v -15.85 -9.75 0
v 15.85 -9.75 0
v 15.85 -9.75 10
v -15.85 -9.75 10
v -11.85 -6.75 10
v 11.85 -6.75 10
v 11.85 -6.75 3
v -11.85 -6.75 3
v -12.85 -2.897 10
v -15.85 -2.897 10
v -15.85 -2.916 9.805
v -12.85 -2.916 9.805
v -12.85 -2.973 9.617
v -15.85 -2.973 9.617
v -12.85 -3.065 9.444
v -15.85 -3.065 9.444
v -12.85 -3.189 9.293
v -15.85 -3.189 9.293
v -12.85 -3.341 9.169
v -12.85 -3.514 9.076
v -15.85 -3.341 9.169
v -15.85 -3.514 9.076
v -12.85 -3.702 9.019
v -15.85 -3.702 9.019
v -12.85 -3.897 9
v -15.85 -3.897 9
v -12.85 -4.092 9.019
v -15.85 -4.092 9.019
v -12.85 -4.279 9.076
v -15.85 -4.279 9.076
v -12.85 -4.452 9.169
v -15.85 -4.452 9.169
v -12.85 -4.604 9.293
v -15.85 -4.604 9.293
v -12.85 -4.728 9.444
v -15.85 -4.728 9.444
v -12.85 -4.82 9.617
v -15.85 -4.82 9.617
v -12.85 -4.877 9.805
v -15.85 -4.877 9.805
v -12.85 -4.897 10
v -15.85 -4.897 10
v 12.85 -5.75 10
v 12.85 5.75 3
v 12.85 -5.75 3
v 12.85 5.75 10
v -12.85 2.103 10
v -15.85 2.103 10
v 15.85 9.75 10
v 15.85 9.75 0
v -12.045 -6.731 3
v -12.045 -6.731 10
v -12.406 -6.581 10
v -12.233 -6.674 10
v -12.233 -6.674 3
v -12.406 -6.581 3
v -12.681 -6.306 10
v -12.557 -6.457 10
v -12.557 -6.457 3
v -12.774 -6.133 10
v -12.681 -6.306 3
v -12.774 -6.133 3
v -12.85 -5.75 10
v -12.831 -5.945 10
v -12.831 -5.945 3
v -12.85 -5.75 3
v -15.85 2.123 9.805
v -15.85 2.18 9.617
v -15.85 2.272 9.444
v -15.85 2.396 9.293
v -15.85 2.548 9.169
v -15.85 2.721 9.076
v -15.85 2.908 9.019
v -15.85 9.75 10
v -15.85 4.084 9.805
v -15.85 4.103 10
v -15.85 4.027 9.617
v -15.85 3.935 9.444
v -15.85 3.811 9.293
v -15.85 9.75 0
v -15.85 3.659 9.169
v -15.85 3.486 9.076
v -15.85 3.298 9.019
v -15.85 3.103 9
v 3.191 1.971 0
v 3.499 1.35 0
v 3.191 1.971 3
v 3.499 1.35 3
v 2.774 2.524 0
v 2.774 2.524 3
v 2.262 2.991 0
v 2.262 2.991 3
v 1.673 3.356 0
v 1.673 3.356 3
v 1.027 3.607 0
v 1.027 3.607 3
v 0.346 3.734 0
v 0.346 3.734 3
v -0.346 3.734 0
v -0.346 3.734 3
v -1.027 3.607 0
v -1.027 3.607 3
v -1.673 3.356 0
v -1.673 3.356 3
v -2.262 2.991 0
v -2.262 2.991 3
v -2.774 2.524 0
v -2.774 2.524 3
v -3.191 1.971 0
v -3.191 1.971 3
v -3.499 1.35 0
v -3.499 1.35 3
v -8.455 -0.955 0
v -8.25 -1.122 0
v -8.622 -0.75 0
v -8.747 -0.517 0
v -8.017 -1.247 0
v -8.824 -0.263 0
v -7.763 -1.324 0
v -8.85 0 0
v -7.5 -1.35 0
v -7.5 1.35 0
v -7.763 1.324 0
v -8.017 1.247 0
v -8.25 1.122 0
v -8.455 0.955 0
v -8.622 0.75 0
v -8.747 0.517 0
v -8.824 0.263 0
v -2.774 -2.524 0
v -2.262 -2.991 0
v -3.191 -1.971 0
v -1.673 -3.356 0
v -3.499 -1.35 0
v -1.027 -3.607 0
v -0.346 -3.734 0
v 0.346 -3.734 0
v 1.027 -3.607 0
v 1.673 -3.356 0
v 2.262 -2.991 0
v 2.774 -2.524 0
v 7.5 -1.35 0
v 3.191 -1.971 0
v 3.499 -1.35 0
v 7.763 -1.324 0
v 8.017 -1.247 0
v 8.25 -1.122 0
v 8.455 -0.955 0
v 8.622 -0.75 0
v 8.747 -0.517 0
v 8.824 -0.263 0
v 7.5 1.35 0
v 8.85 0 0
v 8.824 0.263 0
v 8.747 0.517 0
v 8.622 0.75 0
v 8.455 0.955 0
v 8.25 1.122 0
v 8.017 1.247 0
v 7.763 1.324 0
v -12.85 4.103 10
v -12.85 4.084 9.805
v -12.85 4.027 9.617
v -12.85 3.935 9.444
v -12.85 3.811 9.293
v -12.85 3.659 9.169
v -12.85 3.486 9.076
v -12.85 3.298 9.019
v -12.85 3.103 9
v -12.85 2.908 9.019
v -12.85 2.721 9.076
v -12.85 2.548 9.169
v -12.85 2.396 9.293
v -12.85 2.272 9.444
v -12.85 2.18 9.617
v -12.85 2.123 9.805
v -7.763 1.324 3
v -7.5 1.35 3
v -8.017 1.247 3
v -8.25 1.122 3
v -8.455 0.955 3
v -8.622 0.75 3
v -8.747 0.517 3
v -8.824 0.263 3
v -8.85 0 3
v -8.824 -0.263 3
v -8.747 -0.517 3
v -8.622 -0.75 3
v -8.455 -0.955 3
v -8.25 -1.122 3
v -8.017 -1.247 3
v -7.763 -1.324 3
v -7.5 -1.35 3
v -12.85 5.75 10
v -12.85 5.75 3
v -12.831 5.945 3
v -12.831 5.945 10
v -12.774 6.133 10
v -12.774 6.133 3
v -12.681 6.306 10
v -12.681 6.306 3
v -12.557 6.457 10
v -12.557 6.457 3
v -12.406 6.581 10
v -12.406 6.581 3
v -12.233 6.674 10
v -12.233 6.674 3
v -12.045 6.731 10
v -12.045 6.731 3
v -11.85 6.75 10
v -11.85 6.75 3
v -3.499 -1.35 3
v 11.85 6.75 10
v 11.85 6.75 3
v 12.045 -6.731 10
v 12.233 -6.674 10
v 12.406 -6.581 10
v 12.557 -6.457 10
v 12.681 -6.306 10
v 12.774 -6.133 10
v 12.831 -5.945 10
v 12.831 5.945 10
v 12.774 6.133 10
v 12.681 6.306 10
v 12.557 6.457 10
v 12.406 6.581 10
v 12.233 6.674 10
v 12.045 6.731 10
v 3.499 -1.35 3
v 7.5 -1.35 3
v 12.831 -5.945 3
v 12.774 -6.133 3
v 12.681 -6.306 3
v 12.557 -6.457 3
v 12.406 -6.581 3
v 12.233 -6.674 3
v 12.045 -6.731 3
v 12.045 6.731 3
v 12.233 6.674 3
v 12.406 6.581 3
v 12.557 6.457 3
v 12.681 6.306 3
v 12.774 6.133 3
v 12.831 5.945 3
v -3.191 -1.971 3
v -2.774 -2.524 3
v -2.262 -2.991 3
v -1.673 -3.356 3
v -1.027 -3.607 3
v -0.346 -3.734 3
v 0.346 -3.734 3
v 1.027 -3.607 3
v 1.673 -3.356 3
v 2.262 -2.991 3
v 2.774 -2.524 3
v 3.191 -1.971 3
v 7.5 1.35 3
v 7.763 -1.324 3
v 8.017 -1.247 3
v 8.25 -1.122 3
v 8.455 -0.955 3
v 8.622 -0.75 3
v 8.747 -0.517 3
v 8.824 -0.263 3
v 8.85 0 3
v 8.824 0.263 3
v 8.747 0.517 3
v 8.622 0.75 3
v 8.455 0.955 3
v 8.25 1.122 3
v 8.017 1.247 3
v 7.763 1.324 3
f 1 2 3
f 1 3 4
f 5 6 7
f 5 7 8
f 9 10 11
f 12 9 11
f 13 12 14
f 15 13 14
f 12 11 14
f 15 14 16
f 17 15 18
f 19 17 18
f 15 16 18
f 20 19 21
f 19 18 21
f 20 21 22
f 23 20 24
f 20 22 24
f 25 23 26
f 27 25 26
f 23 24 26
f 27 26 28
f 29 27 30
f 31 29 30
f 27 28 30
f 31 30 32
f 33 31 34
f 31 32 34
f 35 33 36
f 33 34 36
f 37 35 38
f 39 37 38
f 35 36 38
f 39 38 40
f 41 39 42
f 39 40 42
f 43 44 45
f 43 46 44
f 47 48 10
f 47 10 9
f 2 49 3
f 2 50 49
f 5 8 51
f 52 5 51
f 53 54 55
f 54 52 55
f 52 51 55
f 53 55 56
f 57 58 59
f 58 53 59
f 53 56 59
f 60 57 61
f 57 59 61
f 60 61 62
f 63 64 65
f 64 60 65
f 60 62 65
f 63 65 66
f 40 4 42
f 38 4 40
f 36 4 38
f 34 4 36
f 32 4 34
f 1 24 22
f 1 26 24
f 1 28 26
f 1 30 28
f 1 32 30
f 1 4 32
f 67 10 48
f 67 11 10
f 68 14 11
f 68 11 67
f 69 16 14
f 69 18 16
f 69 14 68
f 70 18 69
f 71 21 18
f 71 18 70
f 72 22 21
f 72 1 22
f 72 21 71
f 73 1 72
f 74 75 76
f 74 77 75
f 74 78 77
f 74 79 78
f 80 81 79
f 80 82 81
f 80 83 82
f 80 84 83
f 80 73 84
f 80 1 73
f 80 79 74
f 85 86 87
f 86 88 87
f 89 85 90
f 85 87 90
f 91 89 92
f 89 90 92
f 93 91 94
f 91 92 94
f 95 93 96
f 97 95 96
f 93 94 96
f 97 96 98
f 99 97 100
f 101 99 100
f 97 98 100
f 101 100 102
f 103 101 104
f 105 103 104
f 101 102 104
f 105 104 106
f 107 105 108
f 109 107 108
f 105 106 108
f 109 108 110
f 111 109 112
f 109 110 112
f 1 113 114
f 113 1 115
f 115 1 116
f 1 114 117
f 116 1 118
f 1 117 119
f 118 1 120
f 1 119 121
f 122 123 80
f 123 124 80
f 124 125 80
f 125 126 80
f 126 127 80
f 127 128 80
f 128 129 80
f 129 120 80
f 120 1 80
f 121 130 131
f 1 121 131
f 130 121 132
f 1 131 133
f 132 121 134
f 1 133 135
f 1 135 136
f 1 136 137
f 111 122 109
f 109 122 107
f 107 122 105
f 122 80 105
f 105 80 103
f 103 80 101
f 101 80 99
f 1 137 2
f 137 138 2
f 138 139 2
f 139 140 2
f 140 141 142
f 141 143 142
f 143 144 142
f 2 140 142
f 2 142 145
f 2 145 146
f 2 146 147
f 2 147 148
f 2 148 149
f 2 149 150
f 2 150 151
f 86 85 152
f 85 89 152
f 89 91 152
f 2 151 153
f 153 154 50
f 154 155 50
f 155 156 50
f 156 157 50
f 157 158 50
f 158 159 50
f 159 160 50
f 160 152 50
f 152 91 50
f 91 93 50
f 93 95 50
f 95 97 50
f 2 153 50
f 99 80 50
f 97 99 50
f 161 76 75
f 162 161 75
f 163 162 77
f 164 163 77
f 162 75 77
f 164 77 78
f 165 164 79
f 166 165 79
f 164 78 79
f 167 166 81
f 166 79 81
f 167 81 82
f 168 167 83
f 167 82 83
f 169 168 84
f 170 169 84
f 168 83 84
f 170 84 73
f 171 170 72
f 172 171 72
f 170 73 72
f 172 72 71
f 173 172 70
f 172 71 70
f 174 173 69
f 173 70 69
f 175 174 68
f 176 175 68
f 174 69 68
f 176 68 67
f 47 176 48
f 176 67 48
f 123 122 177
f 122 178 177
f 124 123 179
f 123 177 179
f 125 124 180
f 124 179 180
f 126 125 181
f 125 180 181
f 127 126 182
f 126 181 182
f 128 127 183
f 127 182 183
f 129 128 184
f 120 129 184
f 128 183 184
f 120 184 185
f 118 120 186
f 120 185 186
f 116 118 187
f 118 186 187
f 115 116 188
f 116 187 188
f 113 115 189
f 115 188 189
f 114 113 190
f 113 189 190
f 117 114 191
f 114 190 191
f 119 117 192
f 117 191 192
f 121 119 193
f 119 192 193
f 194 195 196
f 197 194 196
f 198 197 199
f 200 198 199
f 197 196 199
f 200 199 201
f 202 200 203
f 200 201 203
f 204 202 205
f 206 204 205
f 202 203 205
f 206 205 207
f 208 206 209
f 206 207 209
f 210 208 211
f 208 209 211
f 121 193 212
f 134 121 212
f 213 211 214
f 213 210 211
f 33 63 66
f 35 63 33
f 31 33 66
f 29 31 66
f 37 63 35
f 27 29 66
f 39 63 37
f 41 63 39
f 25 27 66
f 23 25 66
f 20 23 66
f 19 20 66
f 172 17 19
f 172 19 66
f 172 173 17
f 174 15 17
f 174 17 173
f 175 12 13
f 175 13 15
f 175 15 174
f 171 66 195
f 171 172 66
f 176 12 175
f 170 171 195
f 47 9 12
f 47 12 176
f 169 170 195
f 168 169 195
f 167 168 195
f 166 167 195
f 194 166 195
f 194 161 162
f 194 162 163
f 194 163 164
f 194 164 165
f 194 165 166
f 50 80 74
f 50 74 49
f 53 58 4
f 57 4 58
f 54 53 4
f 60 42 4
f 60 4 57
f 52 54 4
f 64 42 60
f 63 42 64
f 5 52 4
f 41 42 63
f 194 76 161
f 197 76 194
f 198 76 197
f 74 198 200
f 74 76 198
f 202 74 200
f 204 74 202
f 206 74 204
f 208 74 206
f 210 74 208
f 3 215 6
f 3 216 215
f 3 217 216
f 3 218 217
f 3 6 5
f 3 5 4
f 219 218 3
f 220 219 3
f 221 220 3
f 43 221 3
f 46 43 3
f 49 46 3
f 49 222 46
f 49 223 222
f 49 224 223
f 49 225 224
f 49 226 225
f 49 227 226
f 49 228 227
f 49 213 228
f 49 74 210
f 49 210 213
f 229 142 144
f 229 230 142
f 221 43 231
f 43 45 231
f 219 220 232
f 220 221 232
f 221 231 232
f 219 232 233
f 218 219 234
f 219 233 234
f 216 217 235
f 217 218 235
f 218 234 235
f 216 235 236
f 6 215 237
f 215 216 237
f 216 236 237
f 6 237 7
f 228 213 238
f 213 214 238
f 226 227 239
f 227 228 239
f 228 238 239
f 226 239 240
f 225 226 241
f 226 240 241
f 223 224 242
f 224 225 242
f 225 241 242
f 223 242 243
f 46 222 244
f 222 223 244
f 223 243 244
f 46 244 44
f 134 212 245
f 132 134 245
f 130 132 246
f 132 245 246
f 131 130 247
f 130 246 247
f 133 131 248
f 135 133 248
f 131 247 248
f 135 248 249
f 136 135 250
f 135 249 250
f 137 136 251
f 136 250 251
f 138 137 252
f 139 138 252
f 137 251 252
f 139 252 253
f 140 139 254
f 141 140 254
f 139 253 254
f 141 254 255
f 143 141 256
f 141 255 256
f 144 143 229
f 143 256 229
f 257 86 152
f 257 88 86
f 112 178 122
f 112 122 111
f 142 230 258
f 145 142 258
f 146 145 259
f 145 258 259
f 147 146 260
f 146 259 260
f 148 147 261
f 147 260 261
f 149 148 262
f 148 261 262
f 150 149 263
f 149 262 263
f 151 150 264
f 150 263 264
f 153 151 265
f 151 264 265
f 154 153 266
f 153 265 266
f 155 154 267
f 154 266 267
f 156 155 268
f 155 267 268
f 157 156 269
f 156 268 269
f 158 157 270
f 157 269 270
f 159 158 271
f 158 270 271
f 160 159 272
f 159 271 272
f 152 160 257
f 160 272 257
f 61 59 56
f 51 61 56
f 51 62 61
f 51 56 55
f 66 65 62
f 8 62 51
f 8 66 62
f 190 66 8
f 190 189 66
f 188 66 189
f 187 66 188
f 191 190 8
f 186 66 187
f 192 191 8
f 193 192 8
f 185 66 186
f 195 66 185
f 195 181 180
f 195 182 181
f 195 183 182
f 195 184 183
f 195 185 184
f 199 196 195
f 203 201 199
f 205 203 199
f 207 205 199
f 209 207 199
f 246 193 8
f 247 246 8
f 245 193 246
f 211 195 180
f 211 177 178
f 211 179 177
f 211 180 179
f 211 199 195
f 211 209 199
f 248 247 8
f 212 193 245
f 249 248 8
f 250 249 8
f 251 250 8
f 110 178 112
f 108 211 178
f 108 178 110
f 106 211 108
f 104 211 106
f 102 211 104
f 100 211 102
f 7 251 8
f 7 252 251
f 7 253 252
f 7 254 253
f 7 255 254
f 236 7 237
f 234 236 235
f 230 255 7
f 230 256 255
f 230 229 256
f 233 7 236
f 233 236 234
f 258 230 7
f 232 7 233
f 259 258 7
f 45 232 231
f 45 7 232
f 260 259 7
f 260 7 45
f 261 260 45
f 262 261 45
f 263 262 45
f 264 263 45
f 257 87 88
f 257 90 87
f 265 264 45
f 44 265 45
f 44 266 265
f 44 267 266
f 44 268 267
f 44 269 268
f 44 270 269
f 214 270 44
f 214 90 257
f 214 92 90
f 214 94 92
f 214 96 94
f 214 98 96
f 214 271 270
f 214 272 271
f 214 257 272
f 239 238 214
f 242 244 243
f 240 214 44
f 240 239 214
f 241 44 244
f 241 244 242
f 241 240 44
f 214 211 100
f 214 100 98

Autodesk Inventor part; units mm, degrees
ref_plane "YZ Plane" through (0, 0, 0) normal (1, 0, 0) x (0, 1, 0)
ref_plane "XZ Plane" through (0, 0, 0) normal (0, 1, 0) x (-1, 0, 0)
ref_plane "XY Plane" through (0, 0, 0) normal (0, 0, 1) x (1, 0, 0)
sketch "Skizze1" plane through (0, 0, 0) normal (0, 0, 1) x (1, 0, 0)
  line L0 (0, 22.5879) -> (0, -19.7685)
  line L1 (-28.9042, 0) -> (30.2947, 0)
  line L2 (-15.85, 9.75) -> (15.85, 9.75)
  line L3 (15.85, 9.75) -> (15.85, -9.75)
  line L4 (15.85, -9.75) -> (-15.85, -9.75)
  line L5 (-15.85, -9.75) -> (-15.85, 9.75)
  point P0 (0, 0)
  dimension "d0" = 31.7
  dimension "d1" = 19.5
extrude "Extrusion1" add sketch "Skizze1" along normal blind 10
sketch "Skizze2" plane through (0, 0, 10) normal (0, 0, 1) x (1, 0, 0)
  line L0 (-12.85, 6.75) -> (12.85, 6.75)
  line L1 (12.85, 6.75) -> (12.85, -6.75)
  line L2 (12.85, -6.75) -> (-12.85, -6.75)
  line L3 (-12.85, -6.75) -> (-12.85, 6.75)
  line L4 (15.85, -9.75) -> (15.85, 9.75) projected
  line L5 (-15.85, -9.75) -> (15.85, -9.75) projected
  line L6 (-15.85, 9.75) -> (-15.85, -9.75) projected
  line L7 (15.85, 9.75) -> (-15.85, 9.75) projected
  point P0 (0, 0)
  dimension "d4" = 3
  dimension "d5" = 3
  dimension "d6" = 3
  dimension "d7" = 3
extrude "Extrusion2" cut sketch "Skizze2" against normal blind 7 contours L0 L1 L2 L3
sketch "Skizze3" plane through (-15.85, -9.75, 0) normal (-1, 0, 0) x (0, 0, 1)
  line L0 (10, 0) -> (10, 19.5) projected
  arc A0 (10, 13.8534) -> (10, 11.8534) centre (10, 12.8534) ccw
  arc A1 (10, 6.8534) -> (10, 4.8534) centre (10, 5.8534) ccw
  line L1 (10, 19.5) -> (10, 0) projected
  line L2 (-1.0357, 9.3534) -> (13.3763, 9.3534)
  point P0 (0, 9.75)
  dimension "d10" = 7
  dimension "d11" = 1
  dimension "d12" = 1
extrude "Extrusion3" cut sketch "Skizze3" against normal blind 7
fillet "Rundung1" radius 1 4 edges at (12.85, -6.75, 6.5) (12.85, 6.75, 6.5) (-12.85, 6.75, 6.5) (-12.85, -6.75, 6.5)
sketch "Skizze4" plane through (0, 0, 3) normal (0, 0, 1) x (1, 0, 0)
  arc A0 (12.85, 5.75) -> (11.85, 6.75) centre (11.85, 5.75) ccw projected
  line L0 (11.85, 6.75) -> (-11.85, 6.75) projected
  arc A1 (-11.85, 6.75) -> (-12.85, 5.75) centre (-11.85, 5.75) ccw projected
  line L1 (-12.85, 5.75) -> (-12.85, -5.75) projected
  arc A2 (-12.85, -5.75) -> (-11.85, -6.75) centre (-11.85, -5.75) ccw projected
  line L2 (-11.85, -6.75) -> (11.85, -6.75) projected
  arc A3 (11.85, -6.75) -> (12.85, -5.75) centre (11.85, -5.75) ccw projected
  line L3 (12.85, -5.75) -> (12.85, 5.75) projected
  line L4 (15.85, 9.75) -> (15.85, -9.75) projected
  line L5 (15.85, -9.75) -> (-15.85, -9.75) projected
  line L6 (-15.85, -9.75) -> (-15.85, 9.75) projected
  line L7 (-15.85, 9.75) -> (15.85, 9.75) projected
  circle A4 centre (-7.5, 0) radius 2.5
  circle A5 centre (7.5, 0) radius 2.5
  circle A6 centre (-7.5, 0) radius 1.35
  circle A7 centre (7.5, 0) radius 1.35
  circle A8 centre (0, 0) radius 3.75
  circle A9 centre (0, 0) radius 1.35
  line L8 (-7.5, 1.35) -> (0, 1.35)
  line L9 (-7.5, -1.35) -> (0, -1.35)
  line L10 (0, 1.35) -> (7.5, 1.35)
  line L11 (7.5, -1.35) -> (0, -1.35)
  dimension "d16" = 7.5
  dimension "d17" = 7.5
  dimension "d18" = 5
  dimension "d19" = 5
  dimension "d20" = 2.7
  dimension "d21" = 2.7
  dimension "d22" = 7.5
  dimension "d23" = 2.7
extrude "Extrusion4" cut sketch "Skizze4" against normal blind 5 contours A4 L9 A6 L8 | A4 L8 A8 L9 | A6 | L8 A9 L9 A8 | A8 L10 L8 | L9 L11 A8 | L10 A5 L11 A8 | A8 L11 A9 L10 | A9 | L10 A7 L11 A5 | A7 picked at (-5.3984, -0.1575) picked at (5.3974, -0.0542)
properties part number "ls-halterung"
